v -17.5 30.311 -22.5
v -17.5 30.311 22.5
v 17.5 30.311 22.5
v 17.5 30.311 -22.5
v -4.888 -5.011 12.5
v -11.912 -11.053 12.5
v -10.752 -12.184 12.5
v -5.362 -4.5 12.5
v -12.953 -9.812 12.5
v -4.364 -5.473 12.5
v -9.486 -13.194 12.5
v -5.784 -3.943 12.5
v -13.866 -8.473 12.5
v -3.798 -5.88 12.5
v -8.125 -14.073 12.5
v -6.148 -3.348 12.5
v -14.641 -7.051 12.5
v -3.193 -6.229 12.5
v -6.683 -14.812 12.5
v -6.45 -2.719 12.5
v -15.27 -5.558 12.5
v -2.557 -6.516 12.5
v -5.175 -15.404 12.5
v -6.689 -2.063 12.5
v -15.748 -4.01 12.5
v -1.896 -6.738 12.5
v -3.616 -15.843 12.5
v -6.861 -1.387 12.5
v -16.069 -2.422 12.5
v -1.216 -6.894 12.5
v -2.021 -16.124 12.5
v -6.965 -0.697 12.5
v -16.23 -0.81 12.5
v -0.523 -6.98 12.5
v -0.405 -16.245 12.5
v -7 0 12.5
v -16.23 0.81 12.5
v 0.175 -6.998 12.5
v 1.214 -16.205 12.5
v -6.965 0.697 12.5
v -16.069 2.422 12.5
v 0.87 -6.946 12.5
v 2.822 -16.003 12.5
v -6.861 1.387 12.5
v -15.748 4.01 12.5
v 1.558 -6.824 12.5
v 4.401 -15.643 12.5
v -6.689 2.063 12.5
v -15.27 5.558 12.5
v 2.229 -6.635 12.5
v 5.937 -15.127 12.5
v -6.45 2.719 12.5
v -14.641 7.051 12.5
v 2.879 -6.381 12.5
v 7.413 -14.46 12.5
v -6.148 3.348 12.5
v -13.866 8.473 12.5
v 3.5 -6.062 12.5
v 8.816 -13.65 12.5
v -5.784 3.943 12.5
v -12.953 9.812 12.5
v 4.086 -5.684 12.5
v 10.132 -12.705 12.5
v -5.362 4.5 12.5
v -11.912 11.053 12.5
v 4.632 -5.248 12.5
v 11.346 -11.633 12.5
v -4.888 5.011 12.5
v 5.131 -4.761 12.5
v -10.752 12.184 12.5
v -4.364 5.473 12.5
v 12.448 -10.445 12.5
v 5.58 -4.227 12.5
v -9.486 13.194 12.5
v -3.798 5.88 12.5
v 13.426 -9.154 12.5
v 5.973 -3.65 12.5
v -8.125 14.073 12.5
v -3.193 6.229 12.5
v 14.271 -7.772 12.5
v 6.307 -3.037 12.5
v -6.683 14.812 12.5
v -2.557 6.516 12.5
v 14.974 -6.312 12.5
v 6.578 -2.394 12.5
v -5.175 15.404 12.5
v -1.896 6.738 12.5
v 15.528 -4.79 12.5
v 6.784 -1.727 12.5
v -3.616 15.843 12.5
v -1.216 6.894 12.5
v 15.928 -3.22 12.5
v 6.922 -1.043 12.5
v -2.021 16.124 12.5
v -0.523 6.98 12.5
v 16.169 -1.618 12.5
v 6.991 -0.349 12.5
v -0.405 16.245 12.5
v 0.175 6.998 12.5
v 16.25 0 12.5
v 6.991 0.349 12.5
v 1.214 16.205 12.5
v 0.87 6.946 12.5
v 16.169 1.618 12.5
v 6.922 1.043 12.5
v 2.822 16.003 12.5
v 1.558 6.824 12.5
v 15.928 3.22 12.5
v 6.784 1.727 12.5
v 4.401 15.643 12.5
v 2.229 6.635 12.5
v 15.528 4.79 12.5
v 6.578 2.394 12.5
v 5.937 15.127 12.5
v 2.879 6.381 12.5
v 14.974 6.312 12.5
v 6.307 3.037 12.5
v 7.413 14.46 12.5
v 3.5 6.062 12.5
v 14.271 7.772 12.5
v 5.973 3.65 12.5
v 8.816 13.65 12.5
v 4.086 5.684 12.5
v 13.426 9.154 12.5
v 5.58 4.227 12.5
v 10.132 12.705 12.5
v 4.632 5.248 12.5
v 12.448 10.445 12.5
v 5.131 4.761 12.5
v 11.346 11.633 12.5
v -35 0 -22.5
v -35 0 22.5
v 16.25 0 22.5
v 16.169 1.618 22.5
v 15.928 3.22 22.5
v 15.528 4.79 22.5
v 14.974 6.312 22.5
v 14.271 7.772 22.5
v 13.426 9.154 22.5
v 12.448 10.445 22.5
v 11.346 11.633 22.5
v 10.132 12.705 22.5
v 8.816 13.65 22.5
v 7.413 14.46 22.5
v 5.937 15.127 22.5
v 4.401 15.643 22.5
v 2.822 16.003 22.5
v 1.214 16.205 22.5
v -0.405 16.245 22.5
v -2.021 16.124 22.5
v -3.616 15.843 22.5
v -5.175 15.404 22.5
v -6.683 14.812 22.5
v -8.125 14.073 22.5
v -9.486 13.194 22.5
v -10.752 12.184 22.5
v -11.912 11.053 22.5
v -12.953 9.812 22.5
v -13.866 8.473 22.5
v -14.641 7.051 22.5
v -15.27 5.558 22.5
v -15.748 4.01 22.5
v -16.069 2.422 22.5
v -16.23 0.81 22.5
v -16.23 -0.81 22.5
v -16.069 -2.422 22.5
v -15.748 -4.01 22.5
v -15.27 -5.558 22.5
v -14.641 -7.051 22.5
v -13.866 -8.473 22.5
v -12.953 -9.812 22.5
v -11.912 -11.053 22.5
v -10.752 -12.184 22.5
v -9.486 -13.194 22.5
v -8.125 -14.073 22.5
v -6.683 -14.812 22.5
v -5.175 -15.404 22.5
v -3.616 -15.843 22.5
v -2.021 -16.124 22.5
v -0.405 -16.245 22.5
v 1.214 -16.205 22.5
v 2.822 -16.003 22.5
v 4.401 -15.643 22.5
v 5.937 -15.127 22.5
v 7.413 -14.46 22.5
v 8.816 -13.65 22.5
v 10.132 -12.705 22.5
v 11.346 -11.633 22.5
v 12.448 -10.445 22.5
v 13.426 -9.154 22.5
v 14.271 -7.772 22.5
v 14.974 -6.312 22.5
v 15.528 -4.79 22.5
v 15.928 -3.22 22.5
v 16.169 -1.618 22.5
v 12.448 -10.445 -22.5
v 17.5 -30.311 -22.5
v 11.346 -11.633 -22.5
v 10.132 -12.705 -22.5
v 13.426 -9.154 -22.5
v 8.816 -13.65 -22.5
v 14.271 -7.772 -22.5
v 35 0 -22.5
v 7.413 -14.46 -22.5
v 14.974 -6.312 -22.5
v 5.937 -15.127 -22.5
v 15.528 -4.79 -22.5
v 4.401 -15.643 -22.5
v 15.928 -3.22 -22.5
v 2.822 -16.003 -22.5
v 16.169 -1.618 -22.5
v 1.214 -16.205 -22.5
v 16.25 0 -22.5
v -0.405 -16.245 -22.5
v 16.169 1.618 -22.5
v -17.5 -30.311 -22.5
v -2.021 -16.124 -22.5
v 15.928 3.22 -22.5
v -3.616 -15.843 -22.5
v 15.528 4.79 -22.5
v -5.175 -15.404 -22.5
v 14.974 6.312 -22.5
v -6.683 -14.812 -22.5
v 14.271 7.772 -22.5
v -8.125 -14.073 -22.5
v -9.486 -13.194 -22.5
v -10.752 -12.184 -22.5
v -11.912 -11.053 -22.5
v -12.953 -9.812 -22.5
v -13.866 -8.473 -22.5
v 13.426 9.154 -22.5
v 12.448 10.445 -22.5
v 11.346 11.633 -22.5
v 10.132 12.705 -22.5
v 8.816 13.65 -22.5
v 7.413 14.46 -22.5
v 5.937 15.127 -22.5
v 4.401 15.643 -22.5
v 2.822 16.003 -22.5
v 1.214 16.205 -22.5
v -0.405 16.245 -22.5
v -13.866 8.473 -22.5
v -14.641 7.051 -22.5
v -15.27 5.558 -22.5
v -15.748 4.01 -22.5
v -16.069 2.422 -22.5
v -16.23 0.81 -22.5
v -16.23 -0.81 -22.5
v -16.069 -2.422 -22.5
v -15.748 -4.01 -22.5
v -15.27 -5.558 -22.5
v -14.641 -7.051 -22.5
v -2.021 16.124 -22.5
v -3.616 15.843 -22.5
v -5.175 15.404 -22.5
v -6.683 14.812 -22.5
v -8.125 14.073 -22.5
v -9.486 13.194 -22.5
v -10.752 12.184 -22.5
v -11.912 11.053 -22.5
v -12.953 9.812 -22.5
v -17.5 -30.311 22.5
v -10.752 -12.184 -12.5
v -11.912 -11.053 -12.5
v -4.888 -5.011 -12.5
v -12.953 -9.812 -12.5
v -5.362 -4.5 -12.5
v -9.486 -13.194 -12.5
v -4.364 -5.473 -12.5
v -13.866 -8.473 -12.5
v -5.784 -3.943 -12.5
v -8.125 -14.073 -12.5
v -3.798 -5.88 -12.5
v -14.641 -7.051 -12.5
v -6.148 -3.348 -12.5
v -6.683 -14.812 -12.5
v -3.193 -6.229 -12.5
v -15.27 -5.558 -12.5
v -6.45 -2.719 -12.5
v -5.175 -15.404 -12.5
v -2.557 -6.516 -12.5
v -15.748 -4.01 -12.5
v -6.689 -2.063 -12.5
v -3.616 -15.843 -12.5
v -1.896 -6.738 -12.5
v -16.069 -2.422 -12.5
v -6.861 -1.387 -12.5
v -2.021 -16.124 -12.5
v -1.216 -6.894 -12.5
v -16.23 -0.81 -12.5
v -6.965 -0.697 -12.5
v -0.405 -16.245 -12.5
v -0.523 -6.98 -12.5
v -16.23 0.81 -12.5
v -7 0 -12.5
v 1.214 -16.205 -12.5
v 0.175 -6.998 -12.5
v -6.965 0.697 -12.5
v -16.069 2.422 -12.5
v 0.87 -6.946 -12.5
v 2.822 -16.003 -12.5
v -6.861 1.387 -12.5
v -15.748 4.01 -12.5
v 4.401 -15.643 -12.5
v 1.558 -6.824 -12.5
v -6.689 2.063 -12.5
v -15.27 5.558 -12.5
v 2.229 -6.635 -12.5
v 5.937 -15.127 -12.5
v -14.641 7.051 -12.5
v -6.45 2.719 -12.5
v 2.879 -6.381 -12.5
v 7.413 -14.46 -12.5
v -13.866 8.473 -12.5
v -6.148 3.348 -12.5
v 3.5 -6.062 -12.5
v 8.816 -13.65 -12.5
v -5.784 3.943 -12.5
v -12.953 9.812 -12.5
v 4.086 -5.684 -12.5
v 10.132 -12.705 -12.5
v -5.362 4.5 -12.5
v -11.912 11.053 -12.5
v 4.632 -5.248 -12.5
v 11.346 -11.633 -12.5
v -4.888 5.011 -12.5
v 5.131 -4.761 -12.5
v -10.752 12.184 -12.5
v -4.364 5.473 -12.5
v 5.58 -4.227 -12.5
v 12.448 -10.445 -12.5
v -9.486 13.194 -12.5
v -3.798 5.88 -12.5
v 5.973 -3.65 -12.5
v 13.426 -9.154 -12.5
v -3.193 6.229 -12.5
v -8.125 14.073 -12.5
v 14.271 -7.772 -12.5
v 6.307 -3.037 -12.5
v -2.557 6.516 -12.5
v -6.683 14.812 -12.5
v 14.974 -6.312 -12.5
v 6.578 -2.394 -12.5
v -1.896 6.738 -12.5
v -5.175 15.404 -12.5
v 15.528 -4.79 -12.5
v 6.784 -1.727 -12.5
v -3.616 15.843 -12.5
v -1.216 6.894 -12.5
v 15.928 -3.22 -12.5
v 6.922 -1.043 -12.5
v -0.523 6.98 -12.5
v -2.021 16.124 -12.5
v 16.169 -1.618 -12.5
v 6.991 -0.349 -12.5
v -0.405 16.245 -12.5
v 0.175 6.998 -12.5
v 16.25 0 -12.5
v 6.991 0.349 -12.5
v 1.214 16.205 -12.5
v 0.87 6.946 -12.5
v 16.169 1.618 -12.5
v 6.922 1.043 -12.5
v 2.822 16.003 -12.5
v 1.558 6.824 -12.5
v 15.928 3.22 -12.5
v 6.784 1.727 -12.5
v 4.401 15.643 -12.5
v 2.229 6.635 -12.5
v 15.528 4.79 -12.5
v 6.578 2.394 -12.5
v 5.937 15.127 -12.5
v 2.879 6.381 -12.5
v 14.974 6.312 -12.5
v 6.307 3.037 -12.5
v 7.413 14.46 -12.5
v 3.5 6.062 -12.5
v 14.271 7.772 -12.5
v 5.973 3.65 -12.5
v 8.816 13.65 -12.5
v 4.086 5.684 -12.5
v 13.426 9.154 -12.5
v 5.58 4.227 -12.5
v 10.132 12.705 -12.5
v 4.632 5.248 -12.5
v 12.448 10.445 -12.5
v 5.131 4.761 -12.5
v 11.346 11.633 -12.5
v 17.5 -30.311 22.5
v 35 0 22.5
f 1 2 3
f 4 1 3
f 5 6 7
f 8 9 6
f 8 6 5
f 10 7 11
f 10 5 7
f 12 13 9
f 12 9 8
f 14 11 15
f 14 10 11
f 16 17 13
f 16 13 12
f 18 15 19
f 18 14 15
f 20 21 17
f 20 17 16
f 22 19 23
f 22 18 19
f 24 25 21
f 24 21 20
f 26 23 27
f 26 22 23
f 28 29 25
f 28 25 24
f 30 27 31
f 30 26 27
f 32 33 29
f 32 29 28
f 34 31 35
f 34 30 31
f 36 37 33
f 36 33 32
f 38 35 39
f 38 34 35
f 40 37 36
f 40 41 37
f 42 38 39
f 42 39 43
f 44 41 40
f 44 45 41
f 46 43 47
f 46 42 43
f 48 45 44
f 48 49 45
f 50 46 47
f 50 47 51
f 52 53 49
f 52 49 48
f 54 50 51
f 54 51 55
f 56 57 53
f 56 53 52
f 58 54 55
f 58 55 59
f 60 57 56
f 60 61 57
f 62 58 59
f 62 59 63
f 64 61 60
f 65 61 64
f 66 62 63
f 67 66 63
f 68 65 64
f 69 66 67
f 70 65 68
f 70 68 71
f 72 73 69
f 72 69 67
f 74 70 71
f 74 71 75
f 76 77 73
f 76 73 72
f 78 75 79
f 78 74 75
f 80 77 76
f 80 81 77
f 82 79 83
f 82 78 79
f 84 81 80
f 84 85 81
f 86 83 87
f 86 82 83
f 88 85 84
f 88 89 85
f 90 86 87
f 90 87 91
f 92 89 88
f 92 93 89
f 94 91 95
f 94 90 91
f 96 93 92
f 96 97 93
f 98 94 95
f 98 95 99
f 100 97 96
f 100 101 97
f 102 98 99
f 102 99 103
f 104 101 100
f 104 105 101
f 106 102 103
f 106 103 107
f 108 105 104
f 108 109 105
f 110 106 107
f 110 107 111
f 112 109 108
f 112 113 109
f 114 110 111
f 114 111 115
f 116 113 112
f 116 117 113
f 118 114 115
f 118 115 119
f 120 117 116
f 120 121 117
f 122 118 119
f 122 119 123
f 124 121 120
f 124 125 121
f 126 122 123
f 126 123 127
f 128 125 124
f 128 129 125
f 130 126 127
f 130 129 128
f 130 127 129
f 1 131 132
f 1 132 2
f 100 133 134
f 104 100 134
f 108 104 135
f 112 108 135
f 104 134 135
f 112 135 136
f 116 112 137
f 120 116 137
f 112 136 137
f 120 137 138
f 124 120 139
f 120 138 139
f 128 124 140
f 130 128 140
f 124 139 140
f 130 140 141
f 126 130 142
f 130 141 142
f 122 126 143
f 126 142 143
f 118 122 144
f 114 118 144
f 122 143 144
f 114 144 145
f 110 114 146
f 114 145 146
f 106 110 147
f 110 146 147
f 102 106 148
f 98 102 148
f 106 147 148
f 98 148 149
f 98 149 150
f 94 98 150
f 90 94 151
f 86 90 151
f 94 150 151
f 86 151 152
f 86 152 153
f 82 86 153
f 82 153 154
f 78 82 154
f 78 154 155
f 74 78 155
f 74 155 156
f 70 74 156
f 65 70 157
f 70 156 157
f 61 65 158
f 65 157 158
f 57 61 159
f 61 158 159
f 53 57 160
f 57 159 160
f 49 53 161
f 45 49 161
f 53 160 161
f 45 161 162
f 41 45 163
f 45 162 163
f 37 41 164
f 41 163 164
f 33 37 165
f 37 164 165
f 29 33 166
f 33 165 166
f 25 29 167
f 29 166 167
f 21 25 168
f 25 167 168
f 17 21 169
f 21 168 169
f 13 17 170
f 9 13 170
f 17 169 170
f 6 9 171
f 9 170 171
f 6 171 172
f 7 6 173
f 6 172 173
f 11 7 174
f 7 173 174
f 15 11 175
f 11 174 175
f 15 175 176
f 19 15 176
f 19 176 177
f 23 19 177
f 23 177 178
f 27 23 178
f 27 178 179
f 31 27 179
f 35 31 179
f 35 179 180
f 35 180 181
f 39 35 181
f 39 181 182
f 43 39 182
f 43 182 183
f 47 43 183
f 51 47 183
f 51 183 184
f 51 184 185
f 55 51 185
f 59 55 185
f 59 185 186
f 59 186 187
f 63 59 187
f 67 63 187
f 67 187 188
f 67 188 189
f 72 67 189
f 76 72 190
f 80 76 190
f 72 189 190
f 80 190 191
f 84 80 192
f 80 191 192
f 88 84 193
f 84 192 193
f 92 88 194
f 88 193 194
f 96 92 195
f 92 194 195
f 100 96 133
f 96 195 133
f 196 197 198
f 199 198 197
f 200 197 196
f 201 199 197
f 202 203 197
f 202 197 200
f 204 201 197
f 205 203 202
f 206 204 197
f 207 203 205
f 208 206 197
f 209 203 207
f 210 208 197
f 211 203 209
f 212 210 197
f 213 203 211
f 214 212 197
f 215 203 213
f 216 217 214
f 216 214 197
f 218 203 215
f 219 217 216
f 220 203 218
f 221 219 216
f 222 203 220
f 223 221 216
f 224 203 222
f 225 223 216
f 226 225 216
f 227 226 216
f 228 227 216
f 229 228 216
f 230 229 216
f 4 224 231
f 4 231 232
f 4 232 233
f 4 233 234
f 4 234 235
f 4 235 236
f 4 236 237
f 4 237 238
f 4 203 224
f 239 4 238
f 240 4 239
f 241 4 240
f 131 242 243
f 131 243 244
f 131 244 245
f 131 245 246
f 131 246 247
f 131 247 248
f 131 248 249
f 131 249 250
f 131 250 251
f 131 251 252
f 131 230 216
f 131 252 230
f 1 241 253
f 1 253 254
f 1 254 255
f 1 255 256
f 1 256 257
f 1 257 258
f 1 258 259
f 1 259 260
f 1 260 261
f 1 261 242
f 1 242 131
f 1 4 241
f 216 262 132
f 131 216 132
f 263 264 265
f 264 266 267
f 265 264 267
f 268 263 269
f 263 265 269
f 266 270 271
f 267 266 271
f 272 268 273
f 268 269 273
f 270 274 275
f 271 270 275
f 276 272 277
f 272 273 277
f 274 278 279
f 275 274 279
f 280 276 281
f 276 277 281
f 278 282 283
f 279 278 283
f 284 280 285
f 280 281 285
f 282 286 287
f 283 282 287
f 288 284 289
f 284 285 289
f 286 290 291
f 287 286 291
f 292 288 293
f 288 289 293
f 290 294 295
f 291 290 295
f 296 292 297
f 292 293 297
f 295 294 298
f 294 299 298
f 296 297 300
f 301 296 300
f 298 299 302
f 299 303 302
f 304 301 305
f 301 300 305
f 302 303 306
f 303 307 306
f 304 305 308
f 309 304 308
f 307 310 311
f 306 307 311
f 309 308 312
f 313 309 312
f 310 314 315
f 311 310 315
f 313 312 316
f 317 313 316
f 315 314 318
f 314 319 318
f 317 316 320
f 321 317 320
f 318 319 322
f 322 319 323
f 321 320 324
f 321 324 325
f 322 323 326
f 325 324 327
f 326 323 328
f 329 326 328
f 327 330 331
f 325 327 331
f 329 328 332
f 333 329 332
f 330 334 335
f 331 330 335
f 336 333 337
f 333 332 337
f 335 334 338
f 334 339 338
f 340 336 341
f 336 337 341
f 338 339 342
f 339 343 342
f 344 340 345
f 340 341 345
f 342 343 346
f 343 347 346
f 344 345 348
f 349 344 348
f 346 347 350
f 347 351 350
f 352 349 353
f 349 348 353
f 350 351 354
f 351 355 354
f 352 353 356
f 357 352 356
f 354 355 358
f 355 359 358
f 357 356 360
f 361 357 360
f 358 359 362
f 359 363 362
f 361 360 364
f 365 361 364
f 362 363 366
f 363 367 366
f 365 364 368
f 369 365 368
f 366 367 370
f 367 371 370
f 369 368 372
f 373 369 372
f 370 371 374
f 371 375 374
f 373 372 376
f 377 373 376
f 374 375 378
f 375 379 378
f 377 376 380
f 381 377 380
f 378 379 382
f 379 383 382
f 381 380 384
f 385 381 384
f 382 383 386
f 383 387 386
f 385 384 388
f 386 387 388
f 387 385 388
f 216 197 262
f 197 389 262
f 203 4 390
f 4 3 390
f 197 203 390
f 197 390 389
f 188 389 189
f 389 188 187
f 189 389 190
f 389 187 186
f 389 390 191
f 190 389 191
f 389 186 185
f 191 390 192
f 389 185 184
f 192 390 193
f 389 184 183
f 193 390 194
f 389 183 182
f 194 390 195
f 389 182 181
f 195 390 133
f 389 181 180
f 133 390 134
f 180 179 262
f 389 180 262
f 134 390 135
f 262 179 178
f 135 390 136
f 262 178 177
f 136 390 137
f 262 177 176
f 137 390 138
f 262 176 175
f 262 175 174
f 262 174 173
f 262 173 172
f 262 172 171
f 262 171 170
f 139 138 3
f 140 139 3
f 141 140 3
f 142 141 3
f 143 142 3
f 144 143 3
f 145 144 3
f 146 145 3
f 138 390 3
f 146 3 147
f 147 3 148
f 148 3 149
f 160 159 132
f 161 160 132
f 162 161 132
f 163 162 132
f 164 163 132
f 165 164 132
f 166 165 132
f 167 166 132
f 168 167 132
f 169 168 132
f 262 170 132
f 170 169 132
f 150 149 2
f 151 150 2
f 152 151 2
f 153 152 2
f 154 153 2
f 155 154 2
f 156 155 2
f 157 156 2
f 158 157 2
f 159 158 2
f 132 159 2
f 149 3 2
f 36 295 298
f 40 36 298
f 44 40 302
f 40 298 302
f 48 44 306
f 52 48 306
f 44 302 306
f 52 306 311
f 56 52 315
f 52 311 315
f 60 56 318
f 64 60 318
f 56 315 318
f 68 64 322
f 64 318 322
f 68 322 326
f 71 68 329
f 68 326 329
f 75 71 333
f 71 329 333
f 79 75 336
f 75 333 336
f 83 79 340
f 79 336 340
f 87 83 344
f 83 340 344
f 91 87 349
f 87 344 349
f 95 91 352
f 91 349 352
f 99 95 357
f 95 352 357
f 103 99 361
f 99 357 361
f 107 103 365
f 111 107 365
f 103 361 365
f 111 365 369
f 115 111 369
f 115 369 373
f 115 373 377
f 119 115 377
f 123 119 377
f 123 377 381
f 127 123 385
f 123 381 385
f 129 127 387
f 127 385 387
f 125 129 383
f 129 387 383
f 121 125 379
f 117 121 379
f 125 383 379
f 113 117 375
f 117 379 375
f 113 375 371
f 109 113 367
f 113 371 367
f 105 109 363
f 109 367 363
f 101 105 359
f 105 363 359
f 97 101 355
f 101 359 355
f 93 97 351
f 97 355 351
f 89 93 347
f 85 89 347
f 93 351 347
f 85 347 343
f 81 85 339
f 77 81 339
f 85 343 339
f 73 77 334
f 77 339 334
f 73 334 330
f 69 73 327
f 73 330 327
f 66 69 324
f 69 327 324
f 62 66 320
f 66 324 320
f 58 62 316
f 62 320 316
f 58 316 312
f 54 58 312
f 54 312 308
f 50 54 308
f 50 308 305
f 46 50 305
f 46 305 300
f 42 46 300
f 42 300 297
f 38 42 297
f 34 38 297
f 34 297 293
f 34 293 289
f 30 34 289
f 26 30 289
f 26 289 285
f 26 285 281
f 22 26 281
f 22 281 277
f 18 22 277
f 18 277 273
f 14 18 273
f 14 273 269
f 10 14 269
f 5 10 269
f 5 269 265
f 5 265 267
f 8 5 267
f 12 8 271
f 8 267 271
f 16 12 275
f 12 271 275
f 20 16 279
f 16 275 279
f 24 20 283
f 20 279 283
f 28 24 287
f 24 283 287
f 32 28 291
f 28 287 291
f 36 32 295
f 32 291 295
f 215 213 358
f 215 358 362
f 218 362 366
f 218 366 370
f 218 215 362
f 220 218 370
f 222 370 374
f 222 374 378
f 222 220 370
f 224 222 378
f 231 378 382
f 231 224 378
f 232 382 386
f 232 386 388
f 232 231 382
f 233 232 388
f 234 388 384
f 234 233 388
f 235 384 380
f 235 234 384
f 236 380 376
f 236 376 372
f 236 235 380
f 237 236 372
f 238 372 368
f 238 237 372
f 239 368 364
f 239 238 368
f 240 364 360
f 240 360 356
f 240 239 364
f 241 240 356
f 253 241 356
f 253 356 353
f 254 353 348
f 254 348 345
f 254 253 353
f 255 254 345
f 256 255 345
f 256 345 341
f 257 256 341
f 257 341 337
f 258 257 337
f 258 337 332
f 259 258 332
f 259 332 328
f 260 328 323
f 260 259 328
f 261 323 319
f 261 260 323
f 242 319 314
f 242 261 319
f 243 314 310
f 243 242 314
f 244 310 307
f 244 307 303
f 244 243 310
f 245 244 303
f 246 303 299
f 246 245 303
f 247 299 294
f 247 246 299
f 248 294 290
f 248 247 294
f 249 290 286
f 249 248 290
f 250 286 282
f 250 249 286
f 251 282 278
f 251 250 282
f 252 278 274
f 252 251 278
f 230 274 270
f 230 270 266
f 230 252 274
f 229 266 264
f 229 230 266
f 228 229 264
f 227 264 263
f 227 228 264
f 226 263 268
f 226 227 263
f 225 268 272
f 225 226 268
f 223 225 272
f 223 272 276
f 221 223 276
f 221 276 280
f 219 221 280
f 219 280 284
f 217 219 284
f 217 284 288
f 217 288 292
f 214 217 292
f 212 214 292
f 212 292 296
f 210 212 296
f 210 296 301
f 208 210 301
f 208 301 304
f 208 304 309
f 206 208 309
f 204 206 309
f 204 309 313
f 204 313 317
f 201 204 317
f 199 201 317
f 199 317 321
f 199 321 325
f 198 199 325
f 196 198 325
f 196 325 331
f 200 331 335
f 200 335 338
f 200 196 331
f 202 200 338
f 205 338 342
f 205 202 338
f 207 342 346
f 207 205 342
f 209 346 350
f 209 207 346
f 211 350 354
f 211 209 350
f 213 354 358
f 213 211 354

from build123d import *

# Parameters (mm, degrees)
BOSS_EXTRUDE1_DEPTH = 22.5
SKETCH2_R           = 16.25
CUT_EXTRUDE1_DEPTH  = 10
SKETCH3_R           = 7
CUT_EXTRUDE2_DEPTH  = 25


with BuildPart() as part:
    # Sketch1 → Boss-Extrude1 (new body, symmetric)
    with BuildSketch(Plane.XY):
        Polygon((-17.5, 30.310889132), (17.5, 30.310889132), (35, 0), (17.5, -30.310889132), (-17.5, -30.310889132), (-35, 0), align=None)
    extrude(amount=BOSS_EXTRUDE1_DEPTH, both=True)

    # Sketch2 → Cut-Extrude1 (cut)
    with BuildSketch(Plane.XY.offset(22.5)):
        Circle(SKETCH2_R)
    cut_extrude1 = extrude(amount=-CUT_EXTRUDE1_DEPTH, mode=Mode.SUBTRACT)

    # Mirror1: Cut-Extrude1 across plane
    add(cut_extrude1.mirror(Plane.XY), mode=Mode.SUBTRACT)

    # Sketch3 → Cut-Extrude2 (cut)
    with BuildSketch(Plane(origin=(0, 0, -12.5), x_dir=(-1, 0, 0), z_dir=(0, 0, -1))):
        Circle(SKETCH3_R)
    extrude(amount=-CUT_EXTRUDE2_DEPTH, mode=Mode.SUBTRACT)


solid = part.part
